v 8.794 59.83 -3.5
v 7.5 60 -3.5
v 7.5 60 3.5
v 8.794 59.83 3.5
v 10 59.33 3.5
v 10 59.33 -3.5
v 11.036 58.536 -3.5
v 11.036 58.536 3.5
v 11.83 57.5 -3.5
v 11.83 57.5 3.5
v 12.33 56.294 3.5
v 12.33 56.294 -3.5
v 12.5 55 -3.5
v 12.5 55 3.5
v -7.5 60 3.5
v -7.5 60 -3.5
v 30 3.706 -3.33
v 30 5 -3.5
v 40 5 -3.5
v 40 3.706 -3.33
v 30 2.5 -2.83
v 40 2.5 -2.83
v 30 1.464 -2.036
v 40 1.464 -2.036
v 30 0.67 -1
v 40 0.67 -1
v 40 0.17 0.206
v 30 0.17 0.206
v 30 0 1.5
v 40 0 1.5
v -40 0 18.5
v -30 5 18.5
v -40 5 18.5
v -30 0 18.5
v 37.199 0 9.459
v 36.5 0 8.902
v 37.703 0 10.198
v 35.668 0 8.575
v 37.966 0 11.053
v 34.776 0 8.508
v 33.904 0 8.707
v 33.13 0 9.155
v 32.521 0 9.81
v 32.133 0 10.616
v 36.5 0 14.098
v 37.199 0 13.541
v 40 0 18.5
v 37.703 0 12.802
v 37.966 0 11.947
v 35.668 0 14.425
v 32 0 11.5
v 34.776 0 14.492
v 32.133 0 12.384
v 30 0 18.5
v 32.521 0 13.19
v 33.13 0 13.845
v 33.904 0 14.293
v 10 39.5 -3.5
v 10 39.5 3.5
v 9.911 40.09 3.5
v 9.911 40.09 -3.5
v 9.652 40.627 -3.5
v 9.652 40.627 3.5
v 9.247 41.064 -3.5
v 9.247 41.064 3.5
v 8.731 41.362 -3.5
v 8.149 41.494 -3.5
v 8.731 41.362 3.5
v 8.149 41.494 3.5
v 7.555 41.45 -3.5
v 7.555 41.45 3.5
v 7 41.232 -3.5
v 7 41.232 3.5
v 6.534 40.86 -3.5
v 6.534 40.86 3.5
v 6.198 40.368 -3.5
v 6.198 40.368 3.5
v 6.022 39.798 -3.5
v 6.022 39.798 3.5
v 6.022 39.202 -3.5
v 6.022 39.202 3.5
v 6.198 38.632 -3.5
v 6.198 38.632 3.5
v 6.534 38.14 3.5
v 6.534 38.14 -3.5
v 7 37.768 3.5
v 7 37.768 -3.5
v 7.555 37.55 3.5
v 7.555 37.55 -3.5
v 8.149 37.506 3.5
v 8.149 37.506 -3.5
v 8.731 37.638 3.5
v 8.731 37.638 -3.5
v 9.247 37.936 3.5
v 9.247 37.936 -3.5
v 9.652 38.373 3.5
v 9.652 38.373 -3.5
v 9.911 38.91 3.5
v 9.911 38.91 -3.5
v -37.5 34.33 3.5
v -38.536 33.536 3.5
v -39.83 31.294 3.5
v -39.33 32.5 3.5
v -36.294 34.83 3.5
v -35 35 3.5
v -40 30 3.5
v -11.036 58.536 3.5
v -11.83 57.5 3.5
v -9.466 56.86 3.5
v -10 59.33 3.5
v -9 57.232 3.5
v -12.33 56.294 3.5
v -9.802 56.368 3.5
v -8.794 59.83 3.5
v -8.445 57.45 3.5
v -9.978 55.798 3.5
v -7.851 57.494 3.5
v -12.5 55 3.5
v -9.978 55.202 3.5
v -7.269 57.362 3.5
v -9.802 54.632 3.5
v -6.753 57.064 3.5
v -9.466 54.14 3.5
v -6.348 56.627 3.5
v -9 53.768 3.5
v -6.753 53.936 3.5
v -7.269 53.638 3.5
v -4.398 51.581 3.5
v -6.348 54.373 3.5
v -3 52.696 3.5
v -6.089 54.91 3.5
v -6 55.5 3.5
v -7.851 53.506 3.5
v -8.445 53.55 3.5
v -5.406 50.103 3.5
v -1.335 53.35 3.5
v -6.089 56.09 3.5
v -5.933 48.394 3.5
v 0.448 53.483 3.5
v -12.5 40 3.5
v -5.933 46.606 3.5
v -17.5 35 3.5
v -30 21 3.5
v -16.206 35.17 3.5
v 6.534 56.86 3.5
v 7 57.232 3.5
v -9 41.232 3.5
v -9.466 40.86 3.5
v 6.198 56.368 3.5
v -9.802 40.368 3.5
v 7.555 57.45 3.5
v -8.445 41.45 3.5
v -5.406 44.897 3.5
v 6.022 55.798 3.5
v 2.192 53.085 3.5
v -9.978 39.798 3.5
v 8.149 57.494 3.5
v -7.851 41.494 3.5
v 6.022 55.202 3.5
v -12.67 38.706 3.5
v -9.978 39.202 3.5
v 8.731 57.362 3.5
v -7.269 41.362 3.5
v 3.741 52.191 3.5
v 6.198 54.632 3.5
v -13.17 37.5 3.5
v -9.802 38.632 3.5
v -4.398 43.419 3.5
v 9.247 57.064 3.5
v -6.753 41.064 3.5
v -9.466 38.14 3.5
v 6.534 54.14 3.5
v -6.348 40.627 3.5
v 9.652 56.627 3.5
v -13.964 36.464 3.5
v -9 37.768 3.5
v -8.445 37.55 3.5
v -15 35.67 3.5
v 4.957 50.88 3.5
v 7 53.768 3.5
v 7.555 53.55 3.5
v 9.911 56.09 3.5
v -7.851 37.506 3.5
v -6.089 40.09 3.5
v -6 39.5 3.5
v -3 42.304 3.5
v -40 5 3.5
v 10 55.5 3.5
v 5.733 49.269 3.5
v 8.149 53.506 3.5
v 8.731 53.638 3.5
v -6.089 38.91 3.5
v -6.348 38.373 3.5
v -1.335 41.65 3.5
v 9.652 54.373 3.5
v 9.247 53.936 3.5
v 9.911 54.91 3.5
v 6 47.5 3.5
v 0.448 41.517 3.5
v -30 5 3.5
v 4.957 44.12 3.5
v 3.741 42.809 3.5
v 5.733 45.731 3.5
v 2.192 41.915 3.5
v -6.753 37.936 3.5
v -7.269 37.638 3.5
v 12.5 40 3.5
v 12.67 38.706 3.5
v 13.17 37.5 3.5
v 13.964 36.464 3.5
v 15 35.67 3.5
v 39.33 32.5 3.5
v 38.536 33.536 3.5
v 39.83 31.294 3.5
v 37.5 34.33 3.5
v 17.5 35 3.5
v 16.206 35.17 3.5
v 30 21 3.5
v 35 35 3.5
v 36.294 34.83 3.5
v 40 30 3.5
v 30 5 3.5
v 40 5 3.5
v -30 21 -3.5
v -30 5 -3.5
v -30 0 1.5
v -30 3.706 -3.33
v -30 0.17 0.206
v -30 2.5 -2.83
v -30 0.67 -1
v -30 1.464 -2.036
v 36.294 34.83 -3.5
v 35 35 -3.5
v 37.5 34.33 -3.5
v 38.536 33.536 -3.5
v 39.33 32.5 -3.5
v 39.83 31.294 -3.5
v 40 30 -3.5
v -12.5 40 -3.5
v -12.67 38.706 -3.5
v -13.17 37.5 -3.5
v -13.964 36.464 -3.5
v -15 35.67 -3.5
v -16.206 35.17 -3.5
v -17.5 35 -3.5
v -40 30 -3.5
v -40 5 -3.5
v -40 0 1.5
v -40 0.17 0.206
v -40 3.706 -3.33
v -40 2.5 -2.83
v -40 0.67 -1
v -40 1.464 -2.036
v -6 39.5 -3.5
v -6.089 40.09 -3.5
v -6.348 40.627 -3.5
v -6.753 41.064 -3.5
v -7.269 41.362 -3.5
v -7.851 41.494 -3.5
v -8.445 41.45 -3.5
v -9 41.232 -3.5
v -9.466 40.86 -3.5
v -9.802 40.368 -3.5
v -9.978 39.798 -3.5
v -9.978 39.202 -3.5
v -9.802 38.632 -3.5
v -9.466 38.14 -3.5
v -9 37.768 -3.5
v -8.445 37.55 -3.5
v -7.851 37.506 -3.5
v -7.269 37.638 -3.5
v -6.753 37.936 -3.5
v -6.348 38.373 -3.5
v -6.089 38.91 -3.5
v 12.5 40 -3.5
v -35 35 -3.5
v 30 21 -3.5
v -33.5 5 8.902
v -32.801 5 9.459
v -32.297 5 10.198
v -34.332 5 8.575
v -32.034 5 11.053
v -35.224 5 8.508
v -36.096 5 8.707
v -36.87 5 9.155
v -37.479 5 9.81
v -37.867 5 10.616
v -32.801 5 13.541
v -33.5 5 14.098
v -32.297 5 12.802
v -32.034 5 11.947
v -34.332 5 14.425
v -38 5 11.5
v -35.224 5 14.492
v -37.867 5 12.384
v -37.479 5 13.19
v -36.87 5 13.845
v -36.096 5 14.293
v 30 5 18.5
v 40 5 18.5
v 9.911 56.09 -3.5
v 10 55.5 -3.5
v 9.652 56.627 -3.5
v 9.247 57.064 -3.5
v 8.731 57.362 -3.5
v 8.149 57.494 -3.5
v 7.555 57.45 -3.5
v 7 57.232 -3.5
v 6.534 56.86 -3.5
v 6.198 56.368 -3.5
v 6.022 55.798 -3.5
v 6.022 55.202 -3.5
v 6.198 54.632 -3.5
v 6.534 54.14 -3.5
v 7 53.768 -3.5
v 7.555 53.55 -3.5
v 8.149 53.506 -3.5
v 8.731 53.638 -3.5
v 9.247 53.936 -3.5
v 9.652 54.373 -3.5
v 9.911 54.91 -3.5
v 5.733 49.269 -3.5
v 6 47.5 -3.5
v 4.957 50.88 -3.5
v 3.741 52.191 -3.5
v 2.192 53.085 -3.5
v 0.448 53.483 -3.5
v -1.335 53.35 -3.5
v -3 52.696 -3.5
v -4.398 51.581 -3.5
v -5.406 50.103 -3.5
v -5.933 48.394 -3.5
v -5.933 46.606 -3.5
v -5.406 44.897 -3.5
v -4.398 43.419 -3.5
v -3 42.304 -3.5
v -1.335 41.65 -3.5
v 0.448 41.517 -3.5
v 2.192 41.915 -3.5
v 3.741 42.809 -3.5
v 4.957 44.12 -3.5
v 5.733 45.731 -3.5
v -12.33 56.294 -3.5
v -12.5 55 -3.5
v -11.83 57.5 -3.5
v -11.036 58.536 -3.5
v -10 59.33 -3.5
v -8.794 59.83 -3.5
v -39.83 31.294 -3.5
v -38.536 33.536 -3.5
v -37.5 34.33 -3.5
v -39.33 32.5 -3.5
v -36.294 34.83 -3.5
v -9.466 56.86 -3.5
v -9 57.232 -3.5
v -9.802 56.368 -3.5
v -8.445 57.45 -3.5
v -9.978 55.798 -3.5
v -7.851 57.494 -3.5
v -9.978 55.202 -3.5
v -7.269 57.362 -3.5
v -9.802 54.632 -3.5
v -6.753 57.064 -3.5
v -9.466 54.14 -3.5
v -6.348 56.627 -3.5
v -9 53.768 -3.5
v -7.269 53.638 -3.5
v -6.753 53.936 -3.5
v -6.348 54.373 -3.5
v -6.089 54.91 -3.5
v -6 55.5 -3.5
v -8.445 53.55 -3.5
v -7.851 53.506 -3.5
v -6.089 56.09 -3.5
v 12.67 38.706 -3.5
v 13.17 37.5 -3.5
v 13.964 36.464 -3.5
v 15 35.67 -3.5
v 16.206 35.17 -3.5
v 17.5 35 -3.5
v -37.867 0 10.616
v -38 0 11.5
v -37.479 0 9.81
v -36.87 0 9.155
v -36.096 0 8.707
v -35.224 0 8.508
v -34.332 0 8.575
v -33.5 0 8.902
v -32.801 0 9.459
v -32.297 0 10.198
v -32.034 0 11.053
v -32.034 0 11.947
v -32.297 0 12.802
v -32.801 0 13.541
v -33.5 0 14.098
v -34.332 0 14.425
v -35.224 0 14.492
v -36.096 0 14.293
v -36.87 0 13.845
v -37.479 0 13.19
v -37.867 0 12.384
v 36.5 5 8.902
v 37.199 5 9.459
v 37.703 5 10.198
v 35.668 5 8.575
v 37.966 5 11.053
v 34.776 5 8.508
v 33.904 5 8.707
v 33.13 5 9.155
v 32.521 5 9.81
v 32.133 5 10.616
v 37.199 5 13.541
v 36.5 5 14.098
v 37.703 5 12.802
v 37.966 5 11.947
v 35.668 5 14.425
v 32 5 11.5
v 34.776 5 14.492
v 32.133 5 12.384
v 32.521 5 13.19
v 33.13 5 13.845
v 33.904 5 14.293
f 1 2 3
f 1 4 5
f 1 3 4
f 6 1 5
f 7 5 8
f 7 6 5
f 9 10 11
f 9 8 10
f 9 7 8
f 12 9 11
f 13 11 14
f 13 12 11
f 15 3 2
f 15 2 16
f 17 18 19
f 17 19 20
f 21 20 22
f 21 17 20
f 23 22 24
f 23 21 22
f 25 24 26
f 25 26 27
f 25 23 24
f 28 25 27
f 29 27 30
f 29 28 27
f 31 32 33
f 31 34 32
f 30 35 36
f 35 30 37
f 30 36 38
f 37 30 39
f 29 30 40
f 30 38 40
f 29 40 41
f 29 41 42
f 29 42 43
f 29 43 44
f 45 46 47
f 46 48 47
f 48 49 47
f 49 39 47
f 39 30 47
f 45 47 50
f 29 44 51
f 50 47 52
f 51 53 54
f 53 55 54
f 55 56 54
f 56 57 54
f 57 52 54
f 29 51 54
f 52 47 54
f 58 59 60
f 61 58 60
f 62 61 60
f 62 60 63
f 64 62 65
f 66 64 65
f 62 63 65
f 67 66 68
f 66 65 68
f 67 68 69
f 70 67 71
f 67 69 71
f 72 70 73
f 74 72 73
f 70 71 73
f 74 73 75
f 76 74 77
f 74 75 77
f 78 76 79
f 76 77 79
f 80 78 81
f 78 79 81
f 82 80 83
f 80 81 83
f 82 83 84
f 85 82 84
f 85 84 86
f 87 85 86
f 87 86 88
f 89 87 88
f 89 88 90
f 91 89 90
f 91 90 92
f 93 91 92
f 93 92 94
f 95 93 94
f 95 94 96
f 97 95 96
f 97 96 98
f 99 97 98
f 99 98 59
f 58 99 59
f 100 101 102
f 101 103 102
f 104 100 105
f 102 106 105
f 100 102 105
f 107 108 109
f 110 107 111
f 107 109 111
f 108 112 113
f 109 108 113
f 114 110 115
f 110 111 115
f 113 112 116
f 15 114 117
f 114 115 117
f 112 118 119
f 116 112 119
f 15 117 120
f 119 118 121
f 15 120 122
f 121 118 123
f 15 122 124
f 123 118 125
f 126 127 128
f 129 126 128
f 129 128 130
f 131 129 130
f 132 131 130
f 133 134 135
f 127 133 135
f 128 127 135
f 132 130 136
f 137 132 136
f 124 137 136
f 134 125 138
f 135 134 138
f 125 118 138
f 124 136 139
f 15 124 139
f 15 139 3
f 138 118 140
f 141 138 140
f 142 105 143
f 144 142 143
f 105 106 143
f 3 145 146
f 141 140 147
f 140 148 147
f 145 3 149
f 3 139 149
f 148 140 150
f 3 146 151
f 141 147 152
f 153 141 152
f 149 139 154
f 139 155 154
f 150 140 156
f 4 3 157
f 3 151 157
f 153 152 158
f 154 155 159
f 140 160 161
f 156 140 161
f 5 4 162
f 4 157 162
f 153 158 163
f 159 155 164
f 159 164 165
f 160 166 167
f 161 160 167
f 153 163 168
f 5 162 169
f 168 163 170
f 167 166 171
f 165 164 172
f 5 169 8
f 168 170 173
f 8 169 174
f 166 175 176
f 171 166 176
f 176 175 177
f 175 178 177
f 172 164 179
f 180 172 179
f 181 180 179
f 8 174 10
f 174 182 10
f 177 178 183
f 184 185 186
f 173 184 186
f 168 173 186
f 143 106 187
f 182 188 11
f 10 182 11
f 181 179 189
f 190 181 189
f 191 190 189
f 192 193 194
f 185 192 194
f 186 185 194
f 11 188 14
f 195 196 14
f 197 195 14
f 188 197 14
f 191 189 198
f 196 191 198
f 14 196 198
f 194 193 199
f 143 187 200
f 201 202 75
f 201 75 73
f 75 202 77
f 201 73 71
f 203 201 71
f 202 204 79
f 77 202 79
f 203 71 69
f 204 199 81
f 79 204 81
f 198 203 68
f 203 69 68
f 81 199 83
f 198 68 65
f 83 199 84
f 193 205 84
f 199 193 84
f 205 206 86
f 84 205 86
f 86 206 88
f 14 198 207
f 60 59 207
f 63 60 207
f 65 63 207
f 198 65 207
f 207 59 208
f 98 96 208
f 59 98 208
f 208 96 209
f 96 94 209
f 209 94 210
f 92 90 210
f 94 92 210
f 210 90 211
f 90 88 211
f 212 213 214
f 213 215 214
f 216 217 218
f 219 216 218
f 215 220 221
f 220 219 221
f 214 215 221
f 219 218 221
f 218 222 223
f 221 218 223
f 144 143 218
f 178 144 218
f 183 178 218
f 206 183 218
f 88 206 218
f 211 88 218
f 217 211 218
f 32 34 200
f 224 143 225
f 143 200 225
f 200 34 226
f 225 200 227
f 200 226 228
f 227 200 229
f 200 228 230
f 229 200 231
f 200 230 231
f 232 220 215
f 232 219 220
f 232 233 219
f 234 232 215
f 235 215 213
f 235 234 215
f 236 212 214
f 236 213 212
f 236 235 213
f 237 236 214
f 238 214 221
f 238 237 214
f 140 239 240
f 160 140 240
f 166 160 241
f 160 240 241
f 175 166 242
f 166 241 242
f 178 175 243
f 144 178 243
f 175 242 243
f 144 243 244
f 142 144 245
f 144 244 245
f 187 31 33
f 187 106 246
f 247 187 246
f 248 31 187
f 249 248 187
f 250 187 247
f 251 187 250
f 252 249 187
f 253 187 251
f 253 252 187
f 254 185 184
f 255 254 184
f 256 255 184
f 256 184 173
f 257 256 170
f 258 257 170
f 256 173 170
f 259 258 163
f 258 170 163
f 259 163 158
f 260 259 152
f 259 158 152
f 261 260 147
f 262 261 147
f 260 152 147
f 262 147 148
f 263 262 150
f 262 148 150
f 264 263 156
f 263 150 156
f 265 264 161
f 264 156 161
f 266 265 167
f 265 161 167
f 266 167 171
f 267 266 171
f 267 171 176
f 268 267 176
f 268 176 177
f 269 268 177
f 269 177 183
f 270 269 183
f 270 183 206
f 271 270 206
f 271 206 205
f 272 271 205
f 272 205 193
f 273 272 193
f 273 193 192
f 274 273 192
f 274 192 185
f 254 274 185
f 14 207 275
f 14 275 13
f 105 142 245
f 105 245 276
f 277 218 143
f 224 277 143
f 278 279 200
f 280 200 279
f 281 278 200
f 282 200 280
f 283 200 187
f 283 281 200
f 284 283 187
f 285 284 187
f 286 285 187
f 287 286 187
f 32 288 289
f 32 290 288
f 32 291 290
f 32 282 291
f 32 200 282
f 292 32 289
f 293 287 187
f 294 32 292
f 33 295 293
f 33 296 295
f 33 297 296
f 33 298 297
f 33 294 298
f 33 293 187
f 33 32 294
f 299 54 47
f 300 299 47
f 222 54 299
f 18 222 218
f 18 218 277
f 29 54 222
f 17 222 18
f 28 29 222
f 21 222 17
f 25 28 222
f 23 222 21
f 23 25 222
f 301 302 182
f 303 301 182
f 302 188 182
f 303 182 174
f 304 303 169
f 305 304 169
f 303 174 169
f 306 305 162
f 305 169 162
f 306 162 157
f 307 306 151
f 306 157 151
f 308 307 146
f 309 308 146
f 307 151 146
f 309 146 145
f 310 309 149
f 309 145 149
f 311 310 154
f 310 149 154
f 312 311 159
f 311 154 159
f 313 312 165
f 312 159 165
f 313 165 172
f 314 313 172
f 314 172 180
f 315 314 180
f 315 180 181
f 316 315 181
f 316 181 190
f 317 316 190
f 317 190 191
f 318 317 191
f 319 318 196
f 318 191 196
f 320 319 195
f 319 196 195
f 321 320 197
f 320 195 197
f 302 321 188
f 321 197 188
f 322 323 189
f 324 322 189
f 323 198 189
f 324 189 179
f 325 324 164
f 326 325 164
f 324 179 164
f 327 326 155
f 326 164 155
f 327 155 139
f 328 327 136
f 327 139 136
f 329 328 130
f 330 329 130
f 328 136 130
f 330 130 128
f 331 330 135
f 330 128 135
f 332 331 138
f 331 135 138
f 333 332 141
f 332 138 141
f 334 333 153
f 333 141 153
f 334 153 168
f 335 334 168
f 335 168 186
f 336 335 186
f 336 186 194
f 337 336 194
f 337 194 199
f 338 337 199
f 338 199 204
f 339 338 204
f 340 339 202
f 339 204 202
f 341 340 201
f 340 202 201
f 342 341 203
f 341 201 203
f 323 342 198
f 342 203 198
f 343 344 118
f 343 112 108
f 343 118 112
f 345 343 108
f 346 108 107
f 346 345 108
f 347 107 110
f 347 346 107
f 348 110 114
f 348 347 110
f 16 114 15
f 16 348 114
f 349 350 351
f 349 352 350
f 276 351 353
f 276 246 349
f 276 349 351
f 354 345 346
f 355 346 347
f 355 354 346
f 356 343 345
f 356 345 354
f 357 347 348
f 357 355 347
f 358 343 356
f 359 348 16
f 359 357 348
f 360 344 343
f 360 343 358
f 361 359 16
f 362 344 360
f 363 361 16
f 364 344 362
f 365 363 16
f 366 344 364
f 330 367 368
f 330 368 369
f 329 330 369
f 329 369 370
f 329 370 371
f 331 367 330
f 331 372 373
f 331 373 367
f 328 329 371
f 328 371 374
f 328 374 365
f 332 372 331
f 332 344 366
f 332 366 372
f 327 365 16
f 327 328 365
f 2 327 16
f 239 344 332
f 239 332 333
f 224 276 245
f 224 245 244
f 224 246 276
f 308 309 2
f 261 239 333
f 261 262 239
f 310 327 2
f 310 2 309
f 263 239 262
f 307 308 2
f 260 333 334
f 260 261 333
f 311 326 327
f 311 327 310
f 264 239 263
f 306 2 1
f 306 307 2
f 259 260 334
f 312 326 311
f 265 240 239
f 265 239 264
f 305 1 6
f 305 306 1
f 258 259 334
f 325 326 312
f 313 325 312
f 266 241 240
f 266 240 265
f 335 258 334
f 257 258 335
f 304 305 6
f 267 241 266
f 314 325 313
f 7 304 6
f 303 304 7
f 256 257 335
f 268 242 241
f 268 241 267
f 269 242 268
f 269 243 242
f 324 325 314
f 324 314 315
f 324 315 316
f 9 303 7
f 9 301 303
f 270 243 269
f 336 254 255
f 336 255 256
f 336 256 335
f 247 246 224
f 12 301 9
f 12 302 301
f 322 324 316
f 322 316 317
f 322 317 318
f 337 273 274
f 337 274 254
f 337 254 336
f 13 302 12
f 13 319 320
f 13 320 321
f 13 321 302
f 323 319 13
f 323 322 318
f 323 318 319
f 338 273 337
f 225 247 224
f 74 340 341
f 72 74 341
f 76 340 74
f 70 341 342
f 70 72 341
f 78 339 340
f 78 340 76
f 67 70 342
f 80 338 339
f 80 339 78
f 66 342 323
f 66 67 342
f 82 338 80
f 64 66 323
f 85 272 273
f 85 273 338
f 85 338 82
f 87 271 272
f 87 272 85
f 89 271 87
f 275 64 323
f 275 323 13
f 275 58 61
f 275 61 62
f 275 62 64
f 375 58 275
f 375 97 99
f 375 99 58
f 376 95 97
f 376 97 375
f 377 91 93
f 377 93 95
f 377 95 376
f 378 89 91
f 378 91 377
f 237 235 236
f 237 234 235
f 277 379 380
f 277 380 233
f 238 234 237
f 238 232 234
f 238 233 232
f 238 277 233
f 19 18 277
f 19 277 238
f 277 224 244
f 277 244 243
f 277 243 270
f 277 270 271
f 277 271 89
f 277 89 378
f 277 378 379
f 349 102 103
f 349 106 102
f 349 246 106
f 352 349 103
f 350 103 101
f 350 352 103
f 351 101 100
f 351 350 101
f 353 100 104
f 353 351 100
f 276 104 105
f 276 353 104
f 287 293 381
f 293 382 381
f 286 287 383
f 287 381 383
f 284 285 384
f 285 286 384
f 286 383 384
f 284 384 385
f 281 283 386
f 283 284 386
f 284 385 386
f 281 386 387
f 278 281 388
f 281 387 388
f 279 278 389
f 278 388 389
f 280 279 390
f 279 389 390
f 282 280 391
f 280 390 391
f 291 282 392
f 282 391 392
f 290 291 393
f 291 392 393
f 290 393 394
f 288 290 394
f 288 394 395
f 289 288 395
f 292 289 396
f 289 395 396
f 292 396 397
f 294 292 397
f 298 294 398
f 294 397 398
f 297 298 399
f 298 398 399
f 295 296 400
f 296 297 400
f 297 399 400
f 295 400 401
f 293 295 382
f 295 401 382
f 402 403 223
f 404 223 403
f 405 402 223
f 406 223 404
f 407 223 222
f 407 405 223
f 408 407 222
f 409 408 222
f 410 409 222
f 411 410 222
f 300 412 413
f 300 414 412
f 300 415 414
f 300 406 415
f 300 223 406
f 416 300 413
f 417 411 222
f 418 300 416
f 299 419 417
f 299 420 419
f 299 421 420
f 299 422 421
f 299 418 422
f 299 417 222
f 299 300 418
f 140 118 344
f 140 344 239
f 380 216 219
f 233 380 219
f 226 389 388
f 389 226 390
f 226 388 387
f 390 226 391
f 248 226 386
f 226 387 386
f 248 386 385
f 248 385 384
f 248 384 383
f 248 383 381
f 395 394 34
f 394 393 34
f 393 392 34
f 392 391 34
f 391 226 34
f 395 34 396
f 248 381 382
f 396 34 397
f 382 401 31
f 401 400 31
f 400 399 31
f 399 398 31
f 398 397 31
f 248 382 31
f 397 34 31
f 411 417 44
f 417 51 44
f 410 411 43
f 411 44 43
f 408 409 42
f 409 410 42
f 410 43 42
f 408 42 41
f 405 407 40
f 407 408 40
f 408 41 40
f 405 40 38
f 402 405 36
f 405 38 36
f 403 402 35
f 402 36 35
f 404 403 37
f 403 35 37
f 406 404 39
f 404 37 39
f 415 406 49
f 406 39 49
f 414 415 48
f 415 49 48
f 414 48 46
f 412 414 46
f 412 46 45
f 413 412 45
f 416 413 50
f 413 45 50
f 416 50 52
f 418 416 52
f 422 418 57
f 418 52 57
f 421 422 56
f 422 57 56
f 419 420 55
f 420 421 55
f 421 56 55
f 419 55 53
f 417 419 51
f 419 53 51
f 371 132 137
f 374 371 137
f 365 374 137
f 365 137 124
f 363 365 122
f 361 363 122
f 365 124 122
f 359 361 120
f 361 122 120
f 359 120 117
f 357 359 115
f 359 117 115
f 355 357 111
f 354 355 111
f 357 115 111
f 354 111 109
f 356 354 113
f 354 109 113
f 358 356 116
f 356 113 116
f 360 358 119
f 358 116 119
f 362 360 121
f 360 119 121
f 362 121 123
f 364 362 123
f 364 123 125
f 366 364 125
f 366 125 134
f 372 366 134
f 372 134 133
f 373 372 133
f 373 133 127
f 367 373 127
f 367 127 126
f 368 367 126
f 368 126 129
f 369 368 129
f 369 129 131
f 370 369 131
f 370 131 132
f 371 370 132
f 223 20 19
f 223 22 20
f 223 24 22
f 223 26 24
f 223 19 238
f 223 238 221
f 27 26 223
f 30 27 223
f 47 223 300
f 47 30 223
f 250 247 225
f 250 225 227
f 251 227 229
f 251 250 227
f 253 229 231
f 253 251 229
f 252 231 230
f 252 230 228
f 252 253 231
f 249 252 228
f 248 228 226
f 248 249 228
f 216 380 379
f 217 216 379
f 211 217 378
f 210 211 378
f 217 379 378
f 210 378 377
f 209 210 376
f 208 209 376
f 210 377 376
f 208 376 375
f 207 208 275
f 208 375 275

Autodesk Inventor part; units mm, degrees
ref_plane "YZ Plane" through (0, 0, 0) normal (1, 0, 0) x (0, 1, 0)
ref_plane "XZ Plane" through (0, 0, 0) normal (0, 1, 0) x (-1, 0, 0)
ref_plane "XY Plane" through (0, 0, 0) normal (0, 0, 1) x (1, 0, 0)
sketch "Skizze1" plane through (0, 0, 0) normal (0, 1, 0) x (-1, 0, 0)
  line L0 (40, -3.5) -> (-40, -3.5)
  line L1 (-40, -3.5) -> (-40, 3.5)
  line L2 (-40, 3.5) -> (-30, 3.5)
  line L3 (40, 3.5) -> (40, -3.5)
  line L4 (40, -3.5) -> (-40, 3.5) construction
  line L5 (-40, -3.5) -> (40, 3.5) construction
  line L6 (40, 3.5) -> (30, 3.5)
  line L7 (30, 3.5) -> (30, 18.5)
  line L8 (30, 18.5) -> (40, 18.5)
  line L9 (40, 18.5) -> (40, 3.5)
  circle A0 centre (35, 11.5) radius 3
  line L10 (0, 43.2114) -> (0, -35.1785) construction
  line L11 (-30, 3.5) -> (-30, 18.5)
  line L12 (-30, 18.5) -> (-40, 18.5)
  line L13 (-40, 18.5) -> (-40, 3.5)
  circle A1 centre (-35, 11.5) radius 3
  line L14 (-30, 3.5) -> (30, 3.5)
  line L15 (30, 3.5) -> (40, 3.5)
  line L16 (30, 3.5) -> (30, -3.5)
  line L17 (-30, 3.5) -> (-30, -3.5)
  point P0 (0, 0)
  point P1 (30, 11)
  dimension "d0" = 80
  dimension "d1" = 7
  dimension "d4" = 10
  dimension "d5" = 15
  dimension "d6" = 6
  dimension "d7" = 7
  dimension "d8" = 5
extrude "Extrusion1" add sketch "Skizze1" along normal blind 60 contours L0 L16 L6 L3 | L0 L17 L14 L16 | L0 L1 L2 L17
extrude "Extrusion2" add sketch "Skizze1" along normal blind 5 contours L6 L7 L8 L9 | L2 L13 L12 L11
extrude "Extrusion3" cut sketch "Skizze1" along normal blind 21 contours L0 L17 L14 L16
sketch "Skizze2" plane through (-40, 60, 3.5) normal (0, 0, 1) x (1, 0, 0)
  line L0 (40, -60) -> (40, 40) construction
  circle A0 centre (32, -4.5) radius 2
  line L1 (70, -60) -> (80, -60) projected
  line L2 (40, -12.5) -> (0, -12.5) construction
  line L3 (0, -55) -> (0, 0) construction
  circle A1 centre (48, -4.5) radius 2
  circle A2 centre (32, -20.5) radius 2
  circle A3 centre (48, -20.5) radius 2
  circle A4 centre (40, -12.5) radius 6
  line L4 (0, 0) -> (80, 0) projected
  line L5 (27.5, -25) -> (52.5, -25)
  line L6 (52.5, -25) -> (52.5, 0)
  line L7 (52.5, 0) -> (27.5, 0)
  line L8 (27.5, 0) -> (27.5, -25)
  line L9 (27.5, -25) -> (52.5, 0) construction
  line L10 (52.5, -25) -> (27.5, 0) construction
  line L11 (27.5, -25) -> (0, -25)
  line L12 (0, -25) -> (0, 0)
  line L13 (0, 0) -> (27.5, 0)
  line L14 (27.5, 0) -> (27.5, -25)
  line L15 (80, -55) -> (80, 0) projected
  line L16 (52.5, -25) -> (80, -25)
  line L17 (80, -25) -> (80, 0)
  line L18 (80, 0) -> (52.5, 0)
  line L19 (52.5, 0) -> (52.5, -25)
  dimension "d14" = 4
  dimension "d15" = 47.5
  dimension "d16" = 8
  dimension "d17" = 8
  dimension "d20" = 16
  dimension "d23" = 16
  dimension "d26" = 12
  dimension "d27" = 25
extrude "Extrusion4" cut sketch "Skizze2" against normal up to surface (7 mm away) contours A0 | A1 | A2 | A3 | A4 | L4 L8 L11 L12 | L4 L15 L16 L6
fillet "Rundung1" radius 5 8 edges at (-40, 35, 0) (-12.5, 35, 0) (-12.5, 60, 0) (12.5, 60, 0) (12.5, 35, 0) (40, 35, 0) (-35, 0, -3.5) (35, 0, -3.5)
properties part number "Bracket vorne"
